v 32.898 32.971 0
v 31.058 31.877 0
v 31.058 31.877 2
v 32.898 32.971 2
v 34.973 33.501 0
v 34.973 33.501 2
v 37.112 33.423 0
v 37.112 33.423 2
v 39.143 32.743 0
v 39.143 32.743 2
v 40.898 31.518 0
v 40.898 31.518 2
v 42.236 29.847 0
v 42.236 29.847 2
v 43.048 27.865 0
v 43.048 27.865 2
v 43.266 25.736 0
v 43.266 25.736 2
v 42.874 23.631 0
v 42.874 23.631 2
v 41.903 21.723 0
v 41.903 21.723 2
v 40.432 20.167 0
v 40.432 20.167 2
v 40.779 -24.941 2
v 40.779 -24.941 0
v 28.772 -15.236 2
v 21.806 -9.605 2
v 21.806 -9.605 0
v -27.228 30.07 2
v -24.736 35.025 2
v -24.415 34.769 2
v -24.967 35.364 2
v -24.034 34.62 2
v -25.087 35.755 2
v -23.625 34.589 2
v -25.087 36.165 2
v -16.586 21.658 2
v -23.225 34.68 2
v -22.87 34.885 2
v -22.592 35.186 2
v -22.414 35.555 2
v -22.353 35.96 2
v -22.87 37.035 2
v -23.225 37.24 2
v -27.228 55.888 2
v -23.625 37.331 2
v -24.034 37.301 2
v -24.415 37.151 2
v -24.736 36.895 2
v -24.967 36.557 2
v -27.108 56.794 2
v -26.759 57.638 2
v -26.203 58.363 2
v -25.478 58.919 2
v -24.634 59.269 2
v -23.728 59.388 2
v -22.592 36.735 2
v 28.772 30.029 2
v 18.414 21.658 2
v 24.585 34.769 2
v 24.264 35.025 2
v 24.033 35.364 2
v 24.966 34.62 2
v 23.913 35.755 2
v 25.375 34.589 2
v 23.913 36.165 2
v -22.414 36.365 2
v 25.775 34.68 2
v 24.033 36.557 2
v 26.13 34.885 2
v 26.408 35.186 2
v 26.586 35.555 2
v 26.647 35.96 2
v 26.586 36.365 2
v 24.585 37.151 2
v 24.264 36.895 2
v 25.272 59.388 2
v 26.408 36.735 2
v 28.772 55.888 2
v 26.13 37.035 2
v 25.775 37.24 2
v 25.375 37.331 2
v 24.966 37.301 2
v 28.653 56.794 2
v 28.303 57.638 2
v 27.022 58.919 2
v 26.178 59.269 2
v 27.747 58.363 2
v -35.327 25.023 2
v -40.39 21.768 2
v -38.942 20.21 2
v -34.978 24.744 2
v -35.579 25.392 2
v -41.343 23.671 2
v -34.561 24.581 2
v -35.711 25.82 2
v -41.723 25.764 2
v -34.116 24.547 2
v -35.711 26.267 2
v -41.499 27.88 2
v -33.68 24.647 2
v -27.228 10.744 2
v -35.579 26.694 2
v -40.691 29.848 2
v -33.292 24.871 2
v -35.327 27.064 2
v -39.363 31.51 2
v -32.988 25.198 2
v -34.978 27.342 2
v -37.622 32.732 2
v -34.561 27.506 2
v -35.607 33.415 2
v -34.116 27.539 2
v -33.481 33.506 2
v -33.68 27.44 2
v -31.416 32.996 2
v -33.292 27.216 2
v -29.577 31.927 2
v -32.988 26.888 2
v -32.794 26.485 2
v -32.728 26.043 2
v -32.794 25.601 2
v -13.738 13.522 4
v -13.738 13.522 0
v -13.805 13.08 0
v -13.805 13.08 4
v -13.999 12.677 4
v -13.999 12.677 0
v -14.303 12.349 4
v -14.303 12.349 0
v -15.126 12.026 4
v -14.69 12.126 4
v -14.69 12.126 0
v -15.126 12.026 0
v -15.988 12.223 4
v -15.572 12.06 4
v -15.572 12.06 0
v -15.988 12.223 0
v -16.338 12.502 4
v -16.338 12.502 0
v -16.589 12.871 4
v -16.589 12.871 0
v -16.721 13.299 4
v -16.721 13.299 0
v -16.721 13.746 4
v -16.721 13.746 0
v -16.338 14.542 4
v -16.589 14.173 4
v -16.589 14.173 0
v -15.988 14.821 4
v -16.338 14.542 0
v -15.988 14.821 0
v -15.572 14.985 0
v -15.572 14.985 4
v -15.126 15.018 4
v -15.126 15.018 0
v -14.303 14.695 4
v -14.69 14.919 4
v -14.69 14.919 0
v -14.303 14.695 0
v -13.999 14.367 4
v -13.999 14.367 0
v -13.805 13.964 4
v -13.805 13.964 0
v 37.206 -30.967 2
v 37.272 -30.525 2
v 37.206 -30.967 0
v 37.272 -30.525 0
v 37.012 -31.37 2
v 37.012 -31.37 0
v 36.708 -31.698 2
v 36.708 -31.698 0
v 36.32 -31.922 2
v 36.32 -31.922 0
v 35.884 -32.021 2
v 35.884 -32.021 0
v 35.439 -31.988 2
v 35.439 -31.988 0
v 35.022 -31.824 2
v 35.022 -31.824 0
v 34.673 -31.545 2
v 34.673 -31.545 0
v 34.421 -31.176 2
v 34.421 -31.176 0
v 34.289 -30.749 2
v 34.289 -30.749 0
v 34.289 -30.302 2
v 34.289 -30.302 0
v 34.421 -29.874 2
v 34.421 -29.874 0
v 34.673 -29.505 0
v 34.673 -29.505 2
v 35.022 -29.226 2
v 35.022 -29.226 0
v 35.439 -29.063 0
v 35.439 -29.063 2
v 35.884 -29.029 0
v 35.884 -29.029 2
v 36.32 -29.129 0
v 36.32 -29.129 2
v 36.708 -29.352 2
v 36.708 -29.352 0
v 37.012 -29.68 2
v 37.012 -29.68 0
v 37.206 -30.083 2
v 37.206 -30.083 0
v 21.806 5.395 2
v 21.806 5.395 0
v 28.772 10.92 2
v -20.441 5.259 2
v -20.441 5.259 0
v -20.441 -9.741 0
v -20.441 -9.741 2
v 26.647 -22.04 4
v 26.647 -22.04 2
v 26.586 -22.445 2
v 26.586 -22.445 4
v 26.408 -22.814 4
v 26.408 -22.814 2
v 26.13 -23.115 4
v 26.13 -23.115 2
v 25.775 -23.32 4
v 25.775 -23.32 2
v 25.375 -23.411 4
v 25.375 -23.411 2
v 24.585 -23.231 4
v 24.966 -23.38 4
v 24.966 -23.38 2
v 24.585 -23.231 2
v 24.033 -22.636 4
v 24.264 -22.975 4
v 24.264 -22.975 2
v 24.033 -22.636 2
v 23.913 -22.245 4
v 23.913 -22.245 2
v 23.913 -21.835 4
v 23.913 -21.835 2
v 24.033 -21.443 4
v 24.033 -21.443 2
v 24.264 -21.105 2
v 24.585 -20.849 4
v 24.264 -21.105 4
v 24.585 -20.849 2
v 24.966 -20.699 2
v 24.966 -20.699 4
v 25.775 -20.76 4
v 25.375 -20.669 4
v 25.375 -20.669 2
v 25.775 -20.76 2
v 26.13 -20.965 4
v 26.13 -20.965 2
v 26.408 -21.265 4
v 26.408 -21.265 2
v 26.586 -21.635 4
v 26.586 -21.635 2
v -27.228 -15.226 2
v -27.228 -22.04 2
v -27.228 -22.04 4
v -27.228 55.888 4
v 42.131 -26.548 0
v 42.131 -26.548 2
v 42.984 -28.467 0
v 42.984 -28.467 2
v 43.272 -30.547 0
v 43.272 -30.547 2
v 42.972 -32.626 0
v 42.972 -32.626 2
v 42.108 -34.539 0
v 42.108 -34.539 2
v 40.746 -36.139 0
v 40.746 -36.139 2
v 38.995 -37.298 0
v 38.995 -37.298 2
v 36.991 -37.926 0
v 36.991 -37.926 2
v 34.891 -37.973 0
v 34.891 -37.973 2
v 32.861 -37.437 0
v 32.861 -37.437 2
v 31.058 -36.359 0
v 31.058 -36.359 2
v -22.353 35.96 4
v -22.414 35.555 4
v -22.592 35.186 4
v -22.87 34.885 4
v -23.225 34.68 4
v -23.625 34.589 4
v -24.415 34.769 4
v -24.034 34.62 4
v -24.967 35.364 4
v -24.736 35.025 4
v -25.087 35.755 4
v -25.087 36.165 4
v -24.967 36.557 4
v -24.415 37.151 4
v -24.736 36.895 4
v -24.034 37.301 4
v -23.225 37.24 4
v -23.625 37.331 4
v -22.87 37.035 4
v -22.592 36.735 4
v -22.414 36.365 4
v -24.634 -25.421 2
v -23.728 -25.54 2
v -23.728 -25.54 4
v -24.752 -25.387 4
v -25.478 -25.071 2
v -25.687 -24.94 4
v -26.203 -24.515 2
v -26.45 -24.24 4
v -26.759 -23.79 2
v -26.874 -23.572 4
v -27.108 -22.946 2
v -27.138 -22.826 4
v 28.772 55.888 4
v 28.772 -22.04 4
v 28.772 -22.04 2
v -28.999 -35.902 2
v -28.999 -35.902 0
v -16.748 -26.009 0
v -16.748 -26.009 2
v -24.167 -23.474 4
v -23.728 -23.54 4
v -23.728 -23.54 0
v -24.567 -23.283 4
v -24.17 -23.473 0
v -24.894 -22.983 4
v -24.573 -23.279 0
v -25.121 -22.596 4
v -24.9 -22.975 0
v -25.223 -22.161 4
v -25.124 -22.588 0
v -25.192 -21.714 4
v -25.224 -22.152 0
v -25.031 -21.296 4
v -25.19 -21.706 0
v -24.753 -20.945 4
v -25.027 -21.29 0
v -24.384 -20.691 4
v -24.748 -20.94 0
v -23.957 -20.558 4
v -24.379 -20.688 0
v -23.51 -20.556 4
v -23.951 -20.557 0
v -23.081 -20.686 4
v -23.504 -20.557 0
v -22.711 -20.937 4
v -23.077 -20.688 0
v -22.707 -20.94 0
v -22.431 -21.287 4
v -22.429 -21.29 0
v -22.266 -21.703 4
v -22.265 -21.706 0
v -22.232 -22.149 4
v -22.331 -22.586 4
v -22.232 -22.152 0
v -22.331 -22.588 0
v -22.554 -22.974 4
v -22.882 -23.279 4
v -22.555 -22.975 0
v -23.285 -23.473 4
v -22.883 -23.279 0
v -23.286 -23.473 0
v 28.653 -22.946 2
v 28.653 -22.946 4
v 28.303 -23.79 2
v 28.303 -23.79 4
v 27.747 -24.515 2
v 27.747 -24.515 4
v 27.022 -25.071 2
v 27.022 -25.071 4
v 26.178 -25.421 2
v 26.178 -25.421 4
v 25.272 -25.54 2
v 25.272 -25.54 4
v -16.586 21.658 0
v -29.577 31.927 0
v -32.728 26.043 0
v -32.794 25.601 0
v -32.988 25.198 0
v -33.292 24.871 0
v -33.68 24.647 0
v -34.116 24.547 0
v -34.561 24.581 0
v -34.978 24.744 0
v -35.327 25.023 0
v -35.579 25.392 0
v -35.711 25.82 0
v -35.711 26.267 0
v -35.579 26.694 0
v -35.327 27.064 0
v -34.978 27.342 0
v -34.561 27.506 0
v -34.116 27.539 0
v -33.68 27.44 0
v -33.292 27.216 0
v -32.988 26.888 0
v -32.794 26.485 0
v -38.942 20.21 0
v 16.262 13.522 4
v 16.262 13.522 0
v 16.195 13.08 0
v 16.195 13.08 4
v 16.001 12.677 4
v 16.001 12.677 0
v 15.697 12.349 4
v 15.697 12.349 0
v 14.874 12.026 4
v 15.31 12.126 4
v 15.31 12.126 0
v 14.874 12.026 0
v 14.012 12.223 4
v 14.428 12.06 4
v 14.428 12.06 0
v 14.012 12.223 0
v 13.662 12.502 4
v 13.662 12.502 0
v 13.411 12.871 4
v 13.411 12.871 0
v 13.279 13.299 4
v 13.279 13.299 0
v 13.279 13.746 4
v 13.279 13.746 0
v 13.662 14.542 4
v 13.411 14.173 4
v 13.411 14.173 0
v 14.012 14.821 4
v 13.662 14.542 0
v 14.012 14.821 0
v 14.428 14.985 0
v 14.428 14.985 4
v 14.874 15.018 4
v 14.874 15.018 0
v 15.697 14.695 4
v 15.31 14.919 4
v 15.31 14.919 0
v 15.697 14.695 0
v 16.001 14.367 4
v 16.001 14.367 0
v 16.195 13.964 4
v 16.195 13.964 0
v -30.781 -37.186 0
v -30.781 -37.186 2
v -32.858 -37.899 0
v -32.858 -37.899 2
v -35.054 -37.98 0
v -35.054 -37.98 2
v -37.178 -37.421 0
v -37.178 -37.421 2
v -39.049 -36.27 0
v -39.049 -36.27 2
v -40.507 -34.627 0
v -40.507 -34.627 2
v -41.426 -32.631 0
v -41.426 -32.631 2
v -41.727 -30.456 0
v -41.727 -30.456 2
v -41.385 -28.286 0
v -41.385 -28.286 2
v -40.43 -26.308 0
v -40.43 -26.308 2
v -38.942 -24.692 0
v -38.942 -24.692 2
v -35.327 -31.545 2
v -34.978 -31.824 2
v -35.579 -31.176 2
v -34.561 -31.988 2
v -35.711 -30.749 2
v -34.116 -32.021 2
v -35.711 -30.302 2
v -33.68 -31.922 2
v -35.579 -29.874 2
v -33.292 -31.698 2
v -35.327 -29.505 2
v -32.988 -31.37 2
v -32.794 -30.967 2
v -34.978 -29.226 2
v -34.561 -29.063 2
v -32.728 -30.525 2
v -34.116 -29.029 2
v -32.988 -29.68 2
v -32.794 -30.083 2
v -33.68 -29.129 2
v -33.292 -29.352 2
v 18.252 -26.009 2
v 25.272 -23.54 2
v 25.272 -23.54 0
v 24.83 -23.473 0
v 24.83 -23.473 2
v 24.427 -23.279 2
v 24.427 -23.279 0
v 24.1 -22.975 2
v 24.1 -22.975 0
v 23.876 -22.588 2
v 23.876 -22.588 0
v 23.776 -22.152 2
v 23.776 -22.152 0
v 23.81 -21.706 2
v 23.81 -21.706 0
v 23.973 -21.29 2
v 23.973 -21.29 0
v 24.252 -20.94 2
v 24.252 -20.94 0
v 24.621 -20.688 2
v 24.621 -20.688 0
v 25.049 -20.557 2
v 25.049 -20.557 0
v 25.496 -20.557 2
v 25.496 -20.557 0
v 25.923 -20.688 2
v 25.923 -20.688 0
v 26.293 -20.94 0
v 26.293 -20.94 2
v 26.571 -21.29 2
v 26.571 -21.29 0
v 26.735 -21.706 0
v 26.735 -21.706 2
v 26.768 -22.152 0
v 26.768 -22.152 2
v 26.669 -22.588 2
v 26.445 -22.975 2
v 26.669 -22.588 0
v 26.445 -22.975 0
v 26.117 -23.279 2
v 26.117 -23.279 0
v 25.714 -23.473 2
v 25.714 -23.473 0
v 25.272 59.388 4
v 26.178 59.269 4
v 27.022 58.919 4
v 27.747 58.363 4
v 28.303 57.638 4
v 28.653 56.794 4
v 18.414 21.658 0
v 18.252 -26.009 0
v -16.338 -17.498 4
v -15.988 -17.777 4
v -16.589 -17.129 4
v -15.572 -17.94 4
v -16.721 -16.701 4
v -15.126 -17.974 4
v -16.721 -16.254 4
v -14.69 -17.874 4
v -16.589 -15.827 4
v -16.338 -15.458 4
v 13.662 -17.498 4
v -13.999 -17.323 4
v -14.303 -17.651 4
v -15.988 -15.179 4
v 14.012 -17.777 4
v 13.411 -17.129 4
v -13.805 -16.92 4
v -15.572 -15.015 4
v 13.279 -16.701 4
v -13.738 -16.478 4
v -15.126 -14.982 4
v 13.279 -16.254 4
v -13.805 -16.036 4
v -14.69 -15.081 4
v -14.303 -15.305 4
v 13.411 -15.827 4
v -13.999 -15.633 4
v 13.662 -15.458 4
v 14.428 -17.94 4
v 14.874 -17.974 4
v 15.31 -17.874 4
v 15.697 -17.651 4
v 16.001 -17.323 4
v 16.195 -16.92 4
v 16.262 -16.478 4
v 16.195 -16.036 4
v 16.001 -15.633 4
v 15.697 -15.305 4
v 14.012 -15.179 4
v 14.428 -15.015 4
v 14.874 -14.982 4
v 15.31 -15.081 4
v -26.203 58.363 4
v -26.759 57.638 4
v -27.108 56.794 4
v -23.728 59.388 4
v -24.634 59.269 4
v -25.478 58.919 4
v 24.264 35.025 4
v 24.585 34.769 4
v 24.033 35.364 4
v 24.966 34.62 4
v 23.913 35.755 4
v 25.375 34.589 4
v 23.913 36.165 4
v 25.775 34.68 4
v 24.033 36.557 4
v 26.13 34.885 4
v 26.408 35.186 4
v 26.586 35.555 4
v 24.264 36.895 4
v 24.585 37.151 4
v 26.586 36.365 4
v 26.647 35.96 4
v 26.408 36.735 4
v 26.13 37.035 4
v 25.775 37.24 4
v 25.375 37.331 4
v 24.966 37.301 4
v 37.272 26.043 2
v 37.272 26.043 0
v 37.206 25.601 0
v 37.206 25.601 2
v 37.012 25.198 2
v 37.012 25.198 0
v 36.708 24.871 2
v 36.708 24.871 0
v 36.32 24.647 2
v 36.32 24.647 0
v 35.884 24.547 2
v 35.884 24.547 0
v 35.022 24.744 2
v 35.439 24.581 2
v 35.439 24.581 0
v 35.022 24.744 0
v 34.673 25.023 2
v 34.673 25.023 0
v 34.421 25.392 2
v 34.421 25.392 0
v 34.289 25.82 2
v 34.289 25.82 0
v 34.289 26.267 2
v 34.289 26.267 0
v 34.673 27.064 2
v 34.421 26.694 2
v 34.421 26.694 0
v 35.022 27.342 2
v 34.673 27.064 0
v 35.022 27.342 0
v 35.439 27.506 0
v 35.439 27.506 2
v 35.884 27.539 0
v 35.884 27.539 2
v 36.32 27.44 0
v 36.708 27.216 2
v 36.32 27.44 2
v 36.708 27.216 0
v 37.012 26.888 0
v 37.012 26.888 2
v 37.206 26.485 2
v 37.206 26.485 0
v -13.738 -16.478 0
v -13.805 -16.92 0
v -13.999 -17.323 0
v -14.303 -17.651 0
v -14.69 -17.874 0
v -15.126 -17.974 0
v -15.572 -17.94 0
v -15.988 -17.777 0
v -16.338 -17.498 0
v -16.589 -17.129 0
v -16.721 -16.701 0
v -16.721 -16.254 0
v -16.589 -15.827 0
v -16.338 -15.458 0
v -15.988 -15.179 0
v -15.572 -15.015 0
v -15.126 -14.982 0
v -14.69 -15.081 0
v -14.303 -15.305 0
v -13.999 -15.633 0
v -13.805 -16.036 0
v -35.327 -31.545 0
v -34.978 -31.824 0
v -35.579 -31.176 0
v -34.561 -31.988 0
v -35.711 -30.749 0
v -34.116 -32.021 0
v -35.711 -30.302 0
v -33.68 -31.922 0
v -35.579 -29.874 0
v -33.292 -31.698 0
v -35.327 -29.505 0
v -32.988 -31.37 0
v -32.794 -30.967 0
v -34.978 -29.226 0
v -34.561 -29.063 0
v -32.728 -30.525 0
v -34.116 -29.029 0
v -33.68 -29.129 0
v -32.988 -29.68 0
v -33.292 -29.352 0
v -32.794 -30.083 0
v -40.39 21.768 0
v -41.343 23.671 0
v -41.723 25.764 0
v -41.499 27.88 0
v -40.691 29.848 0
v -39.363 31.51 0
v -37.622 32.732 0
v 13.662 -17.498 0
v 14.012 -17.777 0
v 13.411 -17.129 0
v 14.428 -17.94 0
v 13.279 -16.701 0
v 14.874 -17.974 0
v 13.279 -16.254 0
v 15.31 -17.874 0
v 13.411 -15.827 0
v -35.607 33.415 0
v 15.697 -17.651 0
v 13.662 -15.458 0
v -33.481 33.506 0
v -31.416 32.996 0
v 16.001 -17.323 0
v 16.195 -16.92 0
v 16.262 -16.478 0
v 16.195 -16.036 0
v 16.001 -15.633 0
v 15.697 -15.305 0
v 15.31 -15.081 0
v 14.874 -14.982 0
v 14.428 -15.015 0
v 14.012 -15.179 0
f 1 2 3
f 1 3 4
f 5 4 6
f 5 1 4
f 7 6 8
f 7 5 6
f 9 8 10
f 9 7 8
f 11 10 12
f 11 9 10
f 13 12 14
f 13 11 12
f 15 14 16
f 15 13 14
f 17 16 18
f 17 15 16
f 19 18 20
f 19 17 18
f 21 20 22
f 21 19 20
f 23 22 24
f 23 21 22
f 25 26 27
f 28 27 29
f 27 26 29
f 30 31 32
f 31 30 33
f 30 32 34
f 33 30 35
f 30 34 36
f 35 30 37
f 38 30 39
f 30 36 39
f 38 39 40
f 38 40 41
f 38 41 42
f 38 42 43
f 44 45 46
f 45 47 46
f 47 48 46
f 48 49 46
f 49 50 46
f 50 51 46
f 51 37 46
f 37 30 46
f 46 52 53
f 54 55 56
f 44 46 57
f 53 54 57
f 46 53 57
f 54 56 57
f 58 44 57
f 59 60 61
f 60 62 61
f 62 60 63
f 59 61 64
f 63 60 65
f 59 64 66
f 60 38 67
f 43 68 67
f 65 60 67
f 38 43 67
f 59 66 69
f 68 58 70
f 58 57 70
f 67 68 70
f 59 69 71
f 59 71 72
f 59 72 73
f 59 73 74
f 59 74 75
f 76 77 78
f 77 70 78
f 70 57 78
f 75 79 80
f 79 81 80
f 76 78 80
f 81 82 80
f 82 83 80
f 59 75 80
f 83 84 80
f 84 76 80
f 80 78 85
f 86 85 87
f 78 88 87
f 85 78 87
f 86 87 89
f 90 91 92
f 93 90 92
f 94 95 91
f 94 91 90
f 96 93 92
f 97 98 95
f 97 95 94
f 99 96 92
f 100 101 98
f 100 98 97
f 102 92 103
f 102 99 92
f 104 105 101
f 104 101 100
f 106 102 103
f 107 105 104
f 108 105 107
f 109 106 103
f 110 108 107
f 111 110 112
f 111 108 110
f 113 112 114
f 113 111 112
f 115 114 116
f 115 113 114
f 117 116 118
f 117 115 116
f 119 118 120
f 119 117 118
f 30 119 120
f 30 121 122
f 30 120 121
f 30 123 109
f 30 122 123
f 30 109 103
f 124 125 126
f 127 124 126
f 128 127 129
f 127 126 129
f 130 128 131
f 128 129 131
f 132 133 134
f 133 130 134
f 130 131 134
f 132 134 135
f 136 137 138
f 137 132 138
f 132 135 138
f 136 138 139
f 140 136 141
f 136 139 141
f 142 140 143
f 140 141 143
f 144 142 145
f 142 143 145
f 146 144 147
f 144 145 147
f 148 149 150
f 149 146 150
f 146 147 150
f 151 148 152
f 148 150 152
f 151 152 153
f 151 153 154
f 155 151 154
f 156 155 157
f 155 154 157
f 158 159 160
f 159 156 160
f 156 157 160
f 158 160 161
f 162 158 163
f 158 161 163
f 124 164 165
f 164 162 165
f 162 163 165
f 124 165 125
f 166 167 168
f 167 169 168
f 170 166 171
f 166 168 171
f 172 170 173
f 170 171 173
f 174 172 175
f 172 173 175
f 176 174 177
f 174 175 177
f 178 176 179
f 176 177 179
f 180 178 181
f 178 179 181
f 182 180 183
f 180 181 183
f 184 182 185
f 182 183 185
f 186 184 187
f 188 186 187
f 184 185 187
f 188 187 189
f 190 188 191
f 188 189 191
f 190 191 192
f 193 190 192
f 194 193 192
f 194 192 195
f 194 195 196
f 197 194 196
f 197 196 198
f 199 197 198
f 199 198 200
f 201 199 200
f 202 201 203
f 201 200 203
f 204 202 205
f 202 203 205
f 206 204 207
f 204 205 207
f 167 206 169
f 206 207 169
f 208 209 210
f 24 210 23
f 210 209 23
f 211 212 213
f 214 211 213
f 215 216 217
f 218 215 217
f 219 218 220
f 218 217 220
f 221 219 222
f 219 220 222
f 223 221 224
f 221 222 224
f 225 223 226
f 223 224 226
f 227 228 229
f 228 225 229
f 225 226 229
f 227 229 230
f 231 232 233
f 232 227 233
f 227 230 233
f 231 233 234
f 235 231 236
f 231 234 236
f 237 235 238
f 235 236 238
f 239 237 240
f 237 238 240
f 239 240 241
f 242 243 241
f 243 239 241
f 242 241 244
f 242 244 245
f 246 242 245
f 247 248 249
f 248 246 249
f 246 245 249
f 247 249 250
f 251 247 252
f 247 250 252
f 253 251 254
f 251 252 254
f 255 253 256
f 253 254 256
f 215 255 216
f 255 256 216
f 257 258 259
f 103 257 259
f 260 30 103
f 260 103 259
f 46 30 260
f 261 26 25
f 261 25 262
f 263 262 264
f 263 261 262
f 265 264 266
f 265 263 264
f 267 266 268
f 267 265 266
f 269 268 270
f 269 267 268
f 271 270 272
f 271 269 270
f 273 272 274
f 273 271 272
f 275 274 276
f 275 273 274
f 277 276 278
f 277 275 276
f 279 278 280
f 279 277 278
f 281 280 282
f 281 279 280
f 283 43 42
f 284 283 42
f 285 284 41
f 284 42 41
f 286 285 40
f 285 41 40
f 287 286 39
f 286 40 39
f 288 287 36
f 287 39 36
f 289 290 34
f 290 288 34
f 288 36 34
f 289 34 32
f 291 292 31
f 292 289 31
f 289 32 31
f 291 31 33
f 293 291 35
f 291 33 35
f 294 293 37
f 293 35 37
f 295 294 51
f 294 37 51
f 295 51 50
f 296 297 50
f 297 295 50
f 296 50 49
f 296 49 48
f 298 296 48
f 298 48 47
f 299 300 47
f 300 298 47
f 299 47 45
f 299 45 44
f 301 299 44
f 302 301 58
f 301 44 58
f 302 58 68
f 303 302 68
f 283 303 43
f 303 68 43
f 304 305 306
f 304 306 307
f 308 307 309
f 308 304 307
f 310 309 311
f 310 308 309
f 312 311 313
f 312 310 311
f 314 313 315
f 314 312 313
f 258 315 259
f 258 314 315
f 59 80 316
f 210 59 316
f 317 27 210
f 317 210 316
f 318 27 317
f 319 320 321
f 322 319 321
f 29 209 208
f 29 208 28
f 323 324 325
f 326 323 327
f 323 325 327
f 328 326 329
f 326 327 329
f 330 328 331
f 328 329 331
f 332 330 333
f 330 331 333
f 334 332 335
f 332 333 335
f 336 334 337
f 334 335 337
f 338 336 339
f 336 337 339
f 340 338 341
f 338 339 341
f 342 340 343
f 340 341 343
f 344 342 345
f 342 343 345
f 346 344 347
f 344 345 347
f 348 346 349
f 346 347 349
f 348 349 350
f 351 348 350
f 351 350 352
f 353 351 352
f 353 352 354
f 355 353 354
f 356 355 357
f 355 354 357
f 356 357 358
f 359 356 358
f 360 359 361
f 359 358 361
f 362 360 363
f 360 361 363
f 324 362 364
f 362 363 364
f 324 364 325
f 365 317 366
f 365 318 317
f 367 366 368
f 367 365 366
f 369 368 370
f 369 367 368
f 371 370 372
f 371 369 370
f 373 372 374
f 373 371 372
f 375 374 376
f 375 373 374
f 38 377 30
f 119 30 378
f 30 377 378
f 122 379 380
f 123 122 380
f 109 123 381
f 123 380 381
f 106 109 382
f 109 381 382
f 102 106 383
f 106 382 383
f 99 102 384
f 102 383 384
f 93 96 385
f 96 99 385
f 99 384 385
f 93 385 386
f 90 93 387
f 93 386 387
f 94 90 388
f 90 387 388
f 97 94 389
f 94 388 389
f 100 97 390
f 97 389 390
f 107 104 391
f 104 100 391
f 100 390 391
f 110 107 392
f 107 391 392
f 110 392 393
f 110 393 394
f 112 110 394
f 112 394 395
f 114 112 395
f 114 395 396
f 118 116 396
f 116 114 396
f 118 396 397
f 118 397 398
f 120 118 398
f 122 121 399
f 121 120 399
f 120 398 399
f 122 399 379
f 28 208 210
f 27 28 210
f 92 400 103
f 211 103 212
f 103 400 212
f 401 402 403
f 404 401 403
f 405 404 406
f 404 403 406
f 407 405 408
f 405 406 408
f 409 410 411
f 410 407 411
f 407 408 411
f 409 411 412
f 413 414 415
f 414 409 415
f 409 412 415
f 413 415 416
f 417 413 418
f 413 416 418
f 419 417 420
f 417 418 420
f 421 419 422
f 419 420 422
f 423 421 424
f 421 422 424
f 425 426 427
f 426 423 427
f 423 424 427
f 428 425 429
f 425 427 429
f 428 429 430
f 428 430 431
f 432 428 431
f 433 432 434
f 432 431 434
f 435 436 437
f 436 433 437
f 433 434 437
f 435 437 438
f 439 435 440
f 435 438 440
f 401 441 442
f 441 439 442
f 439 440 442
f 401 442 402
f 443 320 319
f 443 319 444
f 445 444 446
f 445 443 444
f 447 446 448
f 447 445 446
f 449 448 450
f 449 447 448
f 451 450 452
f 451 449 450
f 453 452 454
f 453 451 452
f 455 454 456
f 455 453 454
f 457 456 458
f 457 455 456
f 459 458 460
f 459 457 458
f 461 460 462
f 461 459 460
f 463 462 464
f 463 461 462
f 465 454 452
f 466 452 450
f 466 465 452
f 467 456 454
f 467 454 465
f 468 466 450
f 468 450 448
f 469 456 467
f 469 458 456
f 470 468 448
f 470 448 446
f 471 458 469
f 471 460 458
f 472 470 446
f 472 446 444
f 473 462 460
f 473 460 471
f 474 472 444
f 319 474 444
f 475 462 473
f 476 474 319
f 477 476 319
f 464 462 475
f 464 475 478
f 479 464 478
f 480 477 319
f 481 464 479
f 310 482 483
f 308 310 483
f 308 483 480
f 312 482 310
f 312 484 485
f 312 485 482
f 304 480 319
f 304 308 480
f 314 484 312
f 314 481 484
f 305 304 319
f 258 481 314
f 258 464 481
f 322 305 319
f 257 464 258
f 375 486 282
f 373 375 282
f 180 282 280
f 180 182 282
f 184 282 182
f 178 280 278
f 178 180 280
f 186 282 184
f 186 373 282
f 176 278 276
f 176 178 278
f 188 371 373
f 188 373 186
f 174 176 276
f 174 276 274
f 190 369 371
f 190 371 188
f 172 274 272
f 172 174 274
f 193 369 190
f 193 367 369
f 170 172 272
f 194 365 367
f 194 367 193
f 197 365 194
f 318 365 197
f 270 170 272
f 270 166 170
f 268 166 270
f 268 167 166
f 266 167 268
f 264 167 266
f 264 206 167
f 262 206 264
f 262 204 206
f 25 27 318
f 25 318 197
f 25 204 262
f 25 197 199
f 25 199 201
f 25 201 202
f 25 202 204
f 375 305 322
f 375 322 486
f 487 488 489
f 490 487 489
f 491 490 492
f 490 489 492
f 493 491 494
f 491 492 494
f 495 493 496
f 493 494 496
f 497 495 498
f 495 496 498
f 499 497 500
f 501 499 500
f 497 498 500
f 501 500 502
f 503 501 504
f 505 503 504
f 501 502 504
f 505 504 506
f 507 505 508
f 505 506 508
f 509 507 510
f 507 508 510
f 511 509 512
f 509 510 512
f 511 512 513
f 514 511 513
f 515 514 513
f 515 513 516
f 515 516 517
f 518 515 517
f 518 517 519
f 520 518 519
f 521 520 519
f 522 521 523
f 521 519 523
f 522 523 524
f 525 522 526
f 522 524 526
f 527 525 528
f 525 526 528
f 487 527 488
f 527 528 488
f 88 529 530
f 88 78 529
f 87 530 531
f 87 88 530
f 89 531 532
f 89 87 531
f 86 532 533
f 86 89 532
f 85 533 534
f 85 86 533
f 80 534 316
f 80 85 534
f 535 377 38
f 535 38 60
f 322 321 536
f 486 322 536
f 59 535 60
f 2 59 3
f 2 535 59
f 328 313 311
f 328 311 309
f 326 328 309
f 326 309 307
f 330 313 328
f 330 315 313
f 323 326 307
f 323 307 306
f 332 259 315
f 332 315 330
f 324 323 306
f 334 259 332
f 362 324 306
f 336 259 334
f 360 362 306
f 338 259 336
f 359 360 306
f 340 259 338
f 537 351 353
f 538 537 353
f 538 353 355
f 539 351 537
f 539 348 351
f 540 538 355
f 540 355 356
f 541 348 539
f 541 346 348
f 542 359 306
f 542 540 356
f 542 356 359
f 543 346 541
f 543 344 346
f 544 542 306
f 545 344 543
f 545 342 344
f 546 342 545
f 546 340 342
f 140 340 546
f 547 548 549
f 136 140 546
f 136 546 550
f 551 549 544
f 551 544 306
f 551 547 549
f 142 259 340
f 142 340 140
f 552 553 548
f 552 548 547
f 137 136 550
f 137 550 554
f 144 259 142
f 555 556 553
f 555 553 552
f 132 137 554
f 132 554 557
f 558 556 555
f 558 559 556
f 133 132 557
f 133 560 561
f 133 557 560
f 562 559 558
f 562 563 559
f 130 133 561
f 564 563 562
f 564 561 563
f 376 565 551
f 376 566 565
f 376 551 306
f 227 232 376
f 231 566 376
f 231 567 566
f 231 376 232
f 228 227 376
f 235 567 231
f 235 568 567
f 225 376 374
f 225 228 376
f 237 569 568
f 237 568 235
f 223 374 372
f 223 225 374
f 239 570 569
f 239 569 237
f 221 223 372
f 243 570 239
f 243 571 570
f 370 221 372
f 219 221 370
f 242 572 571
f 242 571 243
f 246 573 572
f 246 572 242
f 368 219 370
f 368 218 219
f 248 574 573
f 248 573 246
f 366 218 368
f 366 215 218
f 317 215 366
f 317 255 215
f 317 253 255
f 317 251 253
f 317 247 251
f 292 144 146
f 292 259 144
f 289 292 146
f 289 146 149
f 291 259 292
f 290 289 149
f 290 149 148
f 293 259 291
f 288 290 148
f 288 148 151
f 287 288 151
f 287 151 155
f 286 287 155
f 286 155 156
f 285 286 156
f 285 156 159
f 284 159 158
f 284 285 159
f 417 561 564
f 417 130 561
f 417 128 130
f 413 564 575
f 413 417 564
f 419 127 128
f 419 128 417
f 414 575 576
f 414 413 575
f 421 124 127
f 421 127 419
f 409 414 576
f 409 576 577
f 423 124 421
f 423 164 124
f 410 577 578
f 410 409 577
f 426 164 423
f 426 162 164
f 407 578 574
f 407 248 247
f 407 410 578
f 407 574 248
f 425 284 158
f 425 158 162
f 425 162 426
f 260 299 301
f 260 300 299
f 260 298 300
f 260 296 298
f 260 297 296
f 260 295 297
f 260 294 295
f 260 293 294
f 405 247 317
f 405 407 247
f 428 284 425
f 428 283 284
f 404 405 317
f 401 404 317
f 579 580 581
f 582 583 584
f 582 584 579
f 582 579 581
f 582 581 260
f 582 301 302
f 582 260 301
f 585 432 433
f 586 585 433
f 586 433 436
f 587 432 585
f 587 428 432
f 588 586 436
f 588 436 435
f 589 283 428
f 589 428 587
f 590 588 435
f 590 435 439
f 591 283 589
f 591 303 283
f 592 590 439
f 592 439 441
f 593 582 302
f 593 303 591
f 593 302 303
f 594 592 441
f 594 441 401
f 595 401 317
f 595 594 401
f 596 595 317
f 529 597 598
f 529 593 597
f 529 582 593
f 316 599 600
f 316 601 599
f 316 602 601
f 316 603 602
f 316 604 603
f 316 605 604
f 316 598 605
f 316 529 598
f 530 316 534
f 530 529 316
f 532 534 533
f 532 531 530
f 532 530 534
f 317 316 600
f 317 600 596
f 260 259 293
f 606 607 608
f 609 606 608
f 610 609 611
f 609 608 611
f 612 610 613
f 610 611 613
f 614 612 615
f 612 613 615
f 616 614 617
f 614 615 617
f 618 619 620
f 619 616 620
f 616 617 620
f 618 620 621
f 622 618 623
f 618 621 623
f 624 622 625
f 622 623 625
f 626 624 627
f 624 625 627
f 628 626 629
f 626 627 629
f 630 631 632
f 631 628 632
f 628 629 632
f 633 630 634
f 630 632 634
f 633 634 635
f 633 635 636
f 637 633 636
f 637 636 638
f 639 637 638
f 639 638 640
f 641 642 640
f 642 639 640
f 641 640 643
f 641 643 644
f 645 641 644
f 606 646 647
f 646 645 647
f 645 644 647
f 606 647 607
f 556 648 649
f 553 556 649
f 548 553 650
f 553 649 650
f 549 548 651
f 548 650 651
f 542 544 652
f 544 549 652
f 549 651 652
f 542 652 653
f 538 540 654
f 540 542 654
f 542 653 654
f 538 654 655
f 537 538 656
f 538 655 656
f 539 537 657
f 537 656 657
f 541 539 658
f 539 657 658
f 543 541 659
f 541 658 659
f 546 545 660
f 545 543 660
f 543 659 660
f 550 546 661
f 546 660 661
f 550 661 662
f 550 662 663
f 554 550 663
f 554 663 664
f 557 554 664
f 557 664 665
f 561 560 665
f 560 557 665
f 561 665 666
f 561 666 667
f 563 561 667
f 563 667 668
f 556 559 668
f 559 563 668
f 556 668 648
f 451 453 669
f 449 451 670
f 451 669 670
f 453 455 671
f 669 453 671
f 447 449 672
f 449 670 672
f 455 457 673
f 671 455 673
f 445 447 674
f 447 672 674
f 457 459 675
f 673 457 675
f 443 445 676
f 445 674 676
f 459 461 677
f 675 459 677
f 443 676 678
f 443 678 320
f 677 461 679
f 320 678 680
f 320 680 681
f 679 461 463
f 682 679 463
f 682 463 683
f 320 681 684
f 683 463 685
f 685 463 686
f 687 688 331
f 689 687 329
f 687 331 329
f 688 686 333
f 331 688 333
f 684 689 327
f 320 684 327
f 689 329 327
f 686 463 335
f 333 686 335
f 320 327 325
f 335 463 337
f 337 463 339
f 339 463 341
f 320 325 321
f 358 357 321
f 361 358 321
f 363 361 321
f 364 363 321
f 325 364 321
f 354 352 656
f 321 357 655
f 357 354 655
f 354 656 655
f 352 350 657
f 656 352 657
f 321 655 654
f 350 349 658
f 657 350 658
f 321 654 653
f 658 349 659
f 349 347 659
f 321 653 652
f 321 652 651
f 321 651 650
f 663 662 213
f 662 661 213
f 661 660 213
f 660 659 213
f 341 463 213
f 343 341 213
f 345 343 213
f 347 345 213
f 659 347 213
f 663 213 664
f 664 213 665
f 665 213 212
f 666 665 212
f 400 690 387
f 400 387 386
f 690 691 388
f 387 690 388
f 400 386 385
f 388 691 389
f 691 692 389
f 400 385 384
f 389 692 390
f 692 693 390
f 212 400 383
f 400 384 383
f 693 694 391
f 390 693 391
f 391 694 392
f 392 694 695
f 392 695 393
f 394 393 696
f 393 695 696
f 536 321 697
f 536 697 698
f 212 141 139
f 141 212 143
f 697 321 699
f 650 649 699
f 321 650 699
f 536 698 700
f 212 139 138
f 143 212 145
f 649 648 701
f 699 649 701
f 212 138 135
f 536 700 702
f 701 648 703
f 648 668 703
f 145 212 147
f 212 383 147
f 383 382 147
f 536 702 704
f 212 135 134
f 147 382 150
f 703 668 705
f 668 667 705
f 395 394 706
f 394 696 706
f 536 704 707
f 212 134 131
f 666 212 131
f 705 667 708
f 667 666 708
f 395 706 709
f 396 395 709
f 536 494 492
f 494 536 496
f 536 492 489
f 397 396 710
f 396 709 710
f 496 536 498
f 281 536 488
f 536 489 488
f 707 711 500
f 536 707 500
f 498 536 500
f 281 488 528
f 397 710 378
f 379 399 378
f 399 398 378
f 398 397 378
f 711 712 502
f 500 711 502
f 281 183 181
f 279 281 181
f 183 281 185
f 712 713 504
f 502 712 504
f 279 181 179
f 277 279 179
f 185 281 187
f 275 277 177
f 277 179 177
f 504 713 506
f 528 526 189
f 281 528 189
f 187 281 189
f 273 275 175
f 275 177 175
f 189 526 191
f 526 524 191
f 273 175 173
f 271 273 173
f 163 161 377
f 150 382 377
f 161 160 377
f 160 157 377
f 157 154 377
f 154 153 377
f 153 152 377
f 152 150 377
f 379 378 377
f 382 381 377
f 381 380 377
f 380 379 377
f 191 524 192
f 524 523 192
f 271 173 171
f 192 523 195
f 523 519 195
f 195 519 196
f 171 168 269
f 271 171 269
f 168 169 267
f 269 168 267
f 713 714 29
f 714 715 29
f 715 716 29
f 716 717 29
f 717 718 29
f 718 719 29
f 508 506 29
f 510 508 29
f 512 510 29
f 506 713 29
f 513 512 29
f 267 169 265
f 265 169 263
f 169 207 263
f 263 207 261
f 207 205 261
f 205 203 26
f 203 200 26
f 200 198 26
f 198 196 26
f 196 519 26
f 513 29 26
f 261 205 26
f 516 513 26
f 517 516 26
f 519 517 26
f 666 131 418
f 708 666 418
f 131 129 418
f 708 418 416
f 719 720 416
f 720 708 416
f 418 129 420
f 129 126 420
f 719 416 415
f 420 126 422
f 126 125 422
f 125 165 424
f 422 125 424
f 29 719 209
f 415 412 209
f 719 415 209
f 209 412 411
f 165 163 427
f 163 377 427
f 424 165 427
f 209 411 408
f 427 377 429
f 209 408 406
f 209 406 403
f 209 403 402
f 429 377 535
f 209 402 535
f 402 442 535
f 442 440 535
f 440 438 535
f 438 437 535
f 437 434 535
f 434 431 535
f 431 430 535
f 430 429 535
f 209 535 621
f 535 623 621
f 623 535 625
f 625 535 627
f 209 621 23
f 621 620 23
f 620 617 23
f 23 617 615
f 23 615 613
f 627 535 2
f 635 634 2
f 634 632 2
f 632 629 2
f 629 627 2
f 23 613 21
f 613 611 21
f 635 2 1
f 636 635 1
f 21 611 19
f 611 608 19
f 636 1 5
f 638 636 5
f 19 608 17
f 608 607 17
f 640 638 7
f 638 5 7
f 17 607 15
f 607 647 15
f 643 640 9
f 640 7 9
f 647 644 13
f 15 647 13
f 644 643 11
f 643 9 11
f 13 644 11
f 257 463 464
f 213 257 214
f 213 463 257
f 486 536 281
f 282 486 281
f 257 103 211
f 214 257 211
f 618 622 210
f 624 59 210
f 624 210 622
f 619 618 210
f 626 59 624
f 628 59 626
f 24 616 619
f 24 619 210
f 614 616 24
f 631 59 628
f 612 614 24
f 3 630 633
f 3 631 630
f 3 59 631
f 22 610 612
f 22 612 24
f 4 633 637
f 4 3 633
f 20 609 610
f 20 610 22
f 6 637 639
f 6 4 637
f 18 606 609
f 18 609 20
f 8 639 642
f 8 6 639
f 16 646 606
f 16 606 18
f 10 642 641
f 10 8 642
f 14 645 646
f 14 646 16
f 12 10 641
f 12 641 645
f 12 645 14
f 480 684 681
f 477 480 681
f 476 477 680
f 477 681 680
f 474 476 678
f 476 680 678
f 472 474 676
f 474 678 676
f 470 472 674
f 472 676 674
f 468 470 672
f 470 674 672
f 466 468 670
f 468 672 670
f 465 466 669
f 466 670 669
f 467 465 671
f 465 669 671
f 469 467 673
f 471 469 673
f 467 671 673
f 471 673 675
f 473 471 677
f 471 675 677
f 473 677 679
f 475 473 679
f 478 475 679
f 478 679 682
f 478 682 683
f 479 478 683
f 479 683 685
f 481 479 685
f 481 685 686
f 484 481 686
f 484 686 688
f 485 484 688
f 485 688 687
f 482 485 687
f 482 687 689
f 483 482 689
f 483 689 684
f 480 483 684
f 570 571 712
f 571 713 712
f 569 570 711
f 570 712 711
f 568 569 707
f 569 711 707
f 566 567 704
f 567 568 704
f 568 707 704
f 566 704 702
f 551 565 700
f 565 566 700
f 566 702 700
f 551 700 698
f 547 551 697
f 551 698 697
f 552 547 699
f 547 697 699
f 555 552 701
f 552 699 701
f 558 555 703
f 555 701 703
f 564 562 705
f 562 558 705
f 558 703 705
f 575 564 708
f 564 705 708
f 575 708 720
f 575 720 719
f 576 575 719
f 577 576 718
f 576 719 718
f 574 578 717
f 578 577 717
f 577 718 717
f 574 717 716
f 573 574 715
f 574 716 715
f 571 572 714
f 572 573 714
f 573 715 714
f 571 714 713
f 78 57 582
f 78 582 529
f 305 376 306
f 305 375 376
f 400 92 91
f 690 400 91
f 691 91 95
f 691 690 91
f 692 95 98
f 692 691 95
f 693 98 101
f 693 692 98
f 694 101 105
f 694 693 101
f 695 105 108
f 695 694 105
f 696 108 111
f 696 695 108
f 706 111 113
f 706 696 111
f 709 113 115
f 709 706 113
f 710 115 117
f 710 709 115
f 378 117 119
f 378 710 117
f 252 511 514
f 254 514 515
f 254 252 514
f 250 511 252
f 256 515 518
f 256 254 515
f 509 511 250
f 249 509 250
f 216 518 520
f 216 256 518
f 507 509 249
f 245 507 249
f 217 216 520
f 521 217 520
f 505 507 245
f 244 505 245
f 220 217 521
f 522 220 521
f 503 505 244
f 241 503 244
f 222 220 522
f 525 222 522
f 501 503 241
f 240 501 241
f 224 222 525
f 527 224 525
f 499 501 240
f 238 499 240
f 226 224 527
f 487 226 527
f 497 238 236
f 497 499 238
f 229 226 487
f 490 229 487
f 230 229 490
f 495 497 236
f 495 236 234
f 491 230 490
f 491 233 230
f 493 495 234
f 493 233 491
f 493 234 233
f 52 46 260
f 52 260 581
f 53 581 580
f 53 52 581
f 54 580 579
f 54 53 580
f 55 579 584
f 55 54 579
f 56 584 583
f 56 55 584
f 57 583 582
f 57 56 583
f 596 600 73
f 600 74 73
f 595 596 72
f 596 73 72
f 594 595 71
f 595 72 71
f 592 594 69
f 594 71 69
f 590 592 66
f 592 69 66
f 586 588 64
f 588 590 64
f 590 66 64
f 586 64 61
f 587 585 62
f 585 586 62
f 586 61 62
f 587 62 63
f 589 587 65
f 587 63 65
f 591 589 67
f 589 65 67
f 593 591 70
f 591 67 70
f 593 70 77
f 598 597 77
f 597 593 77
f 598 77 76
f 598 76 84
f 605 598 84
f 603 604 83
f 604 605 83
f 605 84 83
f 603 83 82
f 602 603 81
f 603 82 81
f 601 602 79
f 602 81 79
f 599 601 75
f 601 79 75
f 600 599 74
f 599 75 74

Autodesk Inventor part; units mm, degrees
ref_plane "YZ Plane" through (0, 0, 0) normal (1, 0, 0) x (0, 1, 0)
ref_plane "XZ Plane" through (0, 0, 0) normal (0, 1, 0) x (-1, 0, 0)
ref_plane "XY Plane" through (0, 0, 0) normal (0, 0, 1) x (1, 0, 0)
sketch "Sketch1" plane through (0, 0, 0) normal (0, 0, 1) x (1, 0, 0)
  arc A0 (-38.9417, -24.6919) -> (-28.9986, -35.9017) centre (-34.2277, -30.5252) ccw
  arc A1 (40.4325, 20.1668) -> (31.0583, 31.8767) centre (35.7723, 26.0433) ccw
  arc A2 (-29.5767, 31.9271) -> (-38.9417, 20.21) centre (-34.2277, 26.0433) ccw
  arc A3 (31.0583, -36.3586) -> (40.1831, -24.4593) centre (35.7723, -30.5252) ccw
  line L0 (-16.5862, 21.6584) -> (18.4138, 21.6584)
  line L1 (-16.7484, -26.0092) -> (18.2516, -26.0092)
  line L2 (-20.4409, 5.259) -> (-20.4409, -9.741)
  line L3 (21.8055, 5.3953) -> (21.8055, -9.6047)
  circle A4 centre (-34.2277, 26.0433) radius 1.5
  circle A5 centre (35.7723, 26.0433) radius 1.5
  circle A6 centre (-34.2277, -30.5252) radius 1.5
  circle A7 centre (35.7723, -30.5252) radius 1.5
  circle A8 centre (-15.238, 13.5222) radius 1.5
  circle A9 centre (14.762, 13.5222) radius 1.5
  circle A10 centre (-15.238, -16.4778) radius 1.5
  circle A11 centre (14.762, -16.4778) radius 1.5
  line L4 (-34.2277, 26.0433) -> (-34.2277, 24.5433)
  line L5 (-34.2277, -29.0252) -> (-34.2277, -30.5252)
  line L6 (-38.9417, 20.21) -> (-20.4409, 5.259)
  line L7 (18.2516, -26.0092) -> (31.0583, -36.3586)
  line L8 (-15.238, 13.5222) -> (-15.238, 12.0222)
  line L9 (-15.238, -14.9778) -> (-15.238, -16.4778)
  line L10 (-38.9417, -24.6919) -> (-20.4409, -9.741)
  line L11 (35.7723, 26.0433) -> (35.7723, 24.5433)
  line L12 (34.2723, 26.0433) -> (35.7723, 26.0433)
  line L13 (40.7786, -24.9407) -> (21.8055, -9.6047)
  line L14 (-16.5862, 21.6584) -> (-29.5767, 31.9271)
  line L15 (-15.238, 15.0222) -> (-15.238, 13.5222)
  line L16 (18.4138, 21.6584) -> (31.0583, 31.8767)
  line L17 (-15.238, 13.5222) -> (-13.738, 13.5222)
  line L18 (13.262, 13.5222) -> (14.762, 13.5222)
  line L19 (14.762, 13.5222) -> (14.762, 12.0222)
  line L20 (14.762, -14.9778) -> (14.762, -16.4778)
  line L21 (14.762, -16.4778) -> (13.262, -16.4778)
  line L22 (-13.738, -16.4778) -> (-15.238, -16.4778)
  line L23 (-28.9986, -35.9017) -> (-16.7484, -26.0092)
  line L24 (21.8055, 5.3953) -> (40.4325, 20.1668)
  line L25 (35.7723, -30.5252) -> (34.2723, -30.5252)
  line L26 (-32.7277, -30.5252) -> (-34.2277, -30.5252)
  line L27 (35.7723, -29.0252) -> (35.7723, -30.5252)
  dimension "d27" = 3
  dimension "d6" = 15
  dimension "d7" = 15
  dimension "d9" = 15
  dimension "d10" = 15
  dimension "d16" = 90
  dimension "d17" = 90
  dimension "d20" = 70
  dimension "d23" = 35
  dimension "d24" = 35
  dimension "d25" = 15
  dimension "d26" = 15
  dimension "d28" = 3
  dimension "d29" = 3
  dimension "d30" = 3
  dimension "d33" = 30
  dimension "d35" = 30
  dimension "d37" = 30
  dimension "d39" = 3
  dimension "d40" = 3
  dimension "d41" = 3
  dimension "d42" = 3
  dimension "d45" = 70
  dimension "d46" = 56.5685
  dimension "d47" = 56.5685
extrude "Extrusion1" add sketch "Sketch1" along normal blind 2 contours L10 L2 L6 A2 L14 L0 L16 A1 L24 L3 L13 A3 L7 L1 L23 A0
sketch "Sketch2" plane through (0, 0, 2) normal (0, 0, 1) x (1, 0, 0)
  line L0 (-23.7277, 59.388) -> (25.2723, 59.388)
  line L1 (25.2723, -25.5399) -> (-23.7277, -25.5399)
  arc A0 (-23.7277, 59.388) -> (-27.2277, 55.888) centre (-23.7277, 55.888) ccw
  arc A1 (28.7723, 55.888) -> (25.2723, 59.388) centre (25.2723, 55.888) ccw
  arc A2 (-27.2277, -22.0399) -> (-23.7277, -25.5399) centre (-23.7277, -22.0399) ccw
  arc A3 (25.2723, -25.5399) -> (28.7723, -22.0399) centre (25.2723, -22.0399) ccw
  circle A4 centre (-23.7277, -22.0399) radius 1.375
  circle A5 centre (25.2723, -22.0399) radius 1.375
  circle A6 centre (-34.2277, -30.5252) radius 1.5 projected
  circle A7 centre (-34.2277, 26.0433) radius 1.5 projected
  circle A8 centre (35.7723, 26.0433) radius 1.5 projected
  circle A9 centre (-15.238, -16.4778) radius 1.5 projected
  circle A10 centre (14.762, -16.4778) radius 1.5 projected
  circle A11 centre (14.762, 13.5222) radius 1.5 projected
  circle A12 centre (35.7723, -30.5252) radius 1.5 projected
  circle A13 centre (-34.2277, -30.5252) radius 1.5 projected
  line L2 (40.7786, -24.9407) -> (21.8055, -9.6047) projected
  line L3 (21.8055, -9.6047) -> (21.8055, 5.3953) projected
  line L4 (21.8055, 5.3953) -> (40.4325, 20.1668) projected
  arc A14 (40.4325, 20.1668) -> (31.0583, 31.8767) centre (35.7723, 26.0433) ccw projected
  line L5 (31.0583, 31.8767) -> (18.4138, 21.6584) projected
  line L6 (18.4138, 21.6584) -> (-16.5862, 21.6584) projected
  line L7 (-16.5862, 21.6584) -> (-29.5767, 31.9271) projected
  arc A15 (-29.5767, 31.9271) -> (-38.9417, 20.21) centre (-34.2277, 26.0433) ccw projected
  line L8 (-38.9417, 20.21) -> (-20.4409, 5.259) projected
  line L9 (-20.4409, 5.259) -> (-20.4409, -9.741) projected
  line L10 (-20.4409, -9.741) -> (-38.9417, -24.6919) projected
  arc A16 (-38.9417, -24.6919) -> (-28.9986, -35.9017) centre (-34.2277, -30.5252) ccw projected
  line L11 (-28.9986, -35.9017) -> (-16.7484, -26.0092) projected
  line L12 (-16.7484, -26.0092) -> (18.2516, -26.0092) projected
  line L13 (18.2516, -26.0092) -> (31.0583, -36.3586) projected
  arc A17 (31.0583, -36.3586) -> (40.7786, -24.9407) centre (35.7723, -30.5252) ccw projected
  circle A18 centre (-15.238, 13.5222) radius 1.5 projected
  circle A19 centre (35.7723, 26.0433) radius 1.5 projected
  circle A20 centre (-34.2277, 26.0433) radius 1.5 projected
  circle A21 centre (-23.7277, 35.9601) radius 1.375
  circle A22 centre (25.2723, 35.9601) radius 1.375
  line L14 (28.7723, 55.888) -> (28.7723, -22.0399)
  line L15 (28.7723, -24.8684) -> (28.7723, -25.5399)
  line L16 (-27.2277, -25.5399) -> (-27.2277, -24.8684)
  line L17 (-27.2277, -22.0399) -> (-27.2277, 55.888)
  line L18 (34.6056, 25.1005) -> (35.7723, 26.0433)
  line L19 (-34.2277, 26.0433) -> (-33.061, 25.1005)
  line L20 (-34.2277, -30.5252) -> (-33.061, -29.5824)
  line L21 (-27.2277, -24.8684) -> (-22.6582, -21.1757)
  line L22 (27.9945, -24.2398) -> (28.7723, -24.8684)
  line L23 (34.6056, -29.5824) -> (35.7723, -30.5252)
  point P0 (0, 0)
  dimension "d54" = 2.75
  dimension "d48" = 56
  dimension "d49" = 85
  dimension "d50" = 7
  dimension "d51" = 7
  dimension "d52" = 7
  dimension "d53" = 7
  dimension "d55" = 2.75
  dimension "d56" = 2.75
  dimension "d57" = 2.75
  dimension "d58" = 58
  dimension "d59" = 58
extrude "Extrusion2" add sketch "Sketch2" along normal blind 2 contours L0 A1 L14 L5 L6 L7 L17 A0 | L7 L6 L5 L14 L4 L3 L2 A3 L1 A2 L17 L10 L9 L8 | L8 L9 L10 L17 | L14 L2 L3 L4
hole "Hole1" at (-23.7277, -22.0399, 4) direction (0, 0, -1) diameter 3 end through all
hole "Hole2" at (25.2723, -22.0399, 2) direction (0, 0, -1) diameter 3 end through all
equation "\"d24\" = d23"
properties part number "ChasisInferiorDron_P9"
